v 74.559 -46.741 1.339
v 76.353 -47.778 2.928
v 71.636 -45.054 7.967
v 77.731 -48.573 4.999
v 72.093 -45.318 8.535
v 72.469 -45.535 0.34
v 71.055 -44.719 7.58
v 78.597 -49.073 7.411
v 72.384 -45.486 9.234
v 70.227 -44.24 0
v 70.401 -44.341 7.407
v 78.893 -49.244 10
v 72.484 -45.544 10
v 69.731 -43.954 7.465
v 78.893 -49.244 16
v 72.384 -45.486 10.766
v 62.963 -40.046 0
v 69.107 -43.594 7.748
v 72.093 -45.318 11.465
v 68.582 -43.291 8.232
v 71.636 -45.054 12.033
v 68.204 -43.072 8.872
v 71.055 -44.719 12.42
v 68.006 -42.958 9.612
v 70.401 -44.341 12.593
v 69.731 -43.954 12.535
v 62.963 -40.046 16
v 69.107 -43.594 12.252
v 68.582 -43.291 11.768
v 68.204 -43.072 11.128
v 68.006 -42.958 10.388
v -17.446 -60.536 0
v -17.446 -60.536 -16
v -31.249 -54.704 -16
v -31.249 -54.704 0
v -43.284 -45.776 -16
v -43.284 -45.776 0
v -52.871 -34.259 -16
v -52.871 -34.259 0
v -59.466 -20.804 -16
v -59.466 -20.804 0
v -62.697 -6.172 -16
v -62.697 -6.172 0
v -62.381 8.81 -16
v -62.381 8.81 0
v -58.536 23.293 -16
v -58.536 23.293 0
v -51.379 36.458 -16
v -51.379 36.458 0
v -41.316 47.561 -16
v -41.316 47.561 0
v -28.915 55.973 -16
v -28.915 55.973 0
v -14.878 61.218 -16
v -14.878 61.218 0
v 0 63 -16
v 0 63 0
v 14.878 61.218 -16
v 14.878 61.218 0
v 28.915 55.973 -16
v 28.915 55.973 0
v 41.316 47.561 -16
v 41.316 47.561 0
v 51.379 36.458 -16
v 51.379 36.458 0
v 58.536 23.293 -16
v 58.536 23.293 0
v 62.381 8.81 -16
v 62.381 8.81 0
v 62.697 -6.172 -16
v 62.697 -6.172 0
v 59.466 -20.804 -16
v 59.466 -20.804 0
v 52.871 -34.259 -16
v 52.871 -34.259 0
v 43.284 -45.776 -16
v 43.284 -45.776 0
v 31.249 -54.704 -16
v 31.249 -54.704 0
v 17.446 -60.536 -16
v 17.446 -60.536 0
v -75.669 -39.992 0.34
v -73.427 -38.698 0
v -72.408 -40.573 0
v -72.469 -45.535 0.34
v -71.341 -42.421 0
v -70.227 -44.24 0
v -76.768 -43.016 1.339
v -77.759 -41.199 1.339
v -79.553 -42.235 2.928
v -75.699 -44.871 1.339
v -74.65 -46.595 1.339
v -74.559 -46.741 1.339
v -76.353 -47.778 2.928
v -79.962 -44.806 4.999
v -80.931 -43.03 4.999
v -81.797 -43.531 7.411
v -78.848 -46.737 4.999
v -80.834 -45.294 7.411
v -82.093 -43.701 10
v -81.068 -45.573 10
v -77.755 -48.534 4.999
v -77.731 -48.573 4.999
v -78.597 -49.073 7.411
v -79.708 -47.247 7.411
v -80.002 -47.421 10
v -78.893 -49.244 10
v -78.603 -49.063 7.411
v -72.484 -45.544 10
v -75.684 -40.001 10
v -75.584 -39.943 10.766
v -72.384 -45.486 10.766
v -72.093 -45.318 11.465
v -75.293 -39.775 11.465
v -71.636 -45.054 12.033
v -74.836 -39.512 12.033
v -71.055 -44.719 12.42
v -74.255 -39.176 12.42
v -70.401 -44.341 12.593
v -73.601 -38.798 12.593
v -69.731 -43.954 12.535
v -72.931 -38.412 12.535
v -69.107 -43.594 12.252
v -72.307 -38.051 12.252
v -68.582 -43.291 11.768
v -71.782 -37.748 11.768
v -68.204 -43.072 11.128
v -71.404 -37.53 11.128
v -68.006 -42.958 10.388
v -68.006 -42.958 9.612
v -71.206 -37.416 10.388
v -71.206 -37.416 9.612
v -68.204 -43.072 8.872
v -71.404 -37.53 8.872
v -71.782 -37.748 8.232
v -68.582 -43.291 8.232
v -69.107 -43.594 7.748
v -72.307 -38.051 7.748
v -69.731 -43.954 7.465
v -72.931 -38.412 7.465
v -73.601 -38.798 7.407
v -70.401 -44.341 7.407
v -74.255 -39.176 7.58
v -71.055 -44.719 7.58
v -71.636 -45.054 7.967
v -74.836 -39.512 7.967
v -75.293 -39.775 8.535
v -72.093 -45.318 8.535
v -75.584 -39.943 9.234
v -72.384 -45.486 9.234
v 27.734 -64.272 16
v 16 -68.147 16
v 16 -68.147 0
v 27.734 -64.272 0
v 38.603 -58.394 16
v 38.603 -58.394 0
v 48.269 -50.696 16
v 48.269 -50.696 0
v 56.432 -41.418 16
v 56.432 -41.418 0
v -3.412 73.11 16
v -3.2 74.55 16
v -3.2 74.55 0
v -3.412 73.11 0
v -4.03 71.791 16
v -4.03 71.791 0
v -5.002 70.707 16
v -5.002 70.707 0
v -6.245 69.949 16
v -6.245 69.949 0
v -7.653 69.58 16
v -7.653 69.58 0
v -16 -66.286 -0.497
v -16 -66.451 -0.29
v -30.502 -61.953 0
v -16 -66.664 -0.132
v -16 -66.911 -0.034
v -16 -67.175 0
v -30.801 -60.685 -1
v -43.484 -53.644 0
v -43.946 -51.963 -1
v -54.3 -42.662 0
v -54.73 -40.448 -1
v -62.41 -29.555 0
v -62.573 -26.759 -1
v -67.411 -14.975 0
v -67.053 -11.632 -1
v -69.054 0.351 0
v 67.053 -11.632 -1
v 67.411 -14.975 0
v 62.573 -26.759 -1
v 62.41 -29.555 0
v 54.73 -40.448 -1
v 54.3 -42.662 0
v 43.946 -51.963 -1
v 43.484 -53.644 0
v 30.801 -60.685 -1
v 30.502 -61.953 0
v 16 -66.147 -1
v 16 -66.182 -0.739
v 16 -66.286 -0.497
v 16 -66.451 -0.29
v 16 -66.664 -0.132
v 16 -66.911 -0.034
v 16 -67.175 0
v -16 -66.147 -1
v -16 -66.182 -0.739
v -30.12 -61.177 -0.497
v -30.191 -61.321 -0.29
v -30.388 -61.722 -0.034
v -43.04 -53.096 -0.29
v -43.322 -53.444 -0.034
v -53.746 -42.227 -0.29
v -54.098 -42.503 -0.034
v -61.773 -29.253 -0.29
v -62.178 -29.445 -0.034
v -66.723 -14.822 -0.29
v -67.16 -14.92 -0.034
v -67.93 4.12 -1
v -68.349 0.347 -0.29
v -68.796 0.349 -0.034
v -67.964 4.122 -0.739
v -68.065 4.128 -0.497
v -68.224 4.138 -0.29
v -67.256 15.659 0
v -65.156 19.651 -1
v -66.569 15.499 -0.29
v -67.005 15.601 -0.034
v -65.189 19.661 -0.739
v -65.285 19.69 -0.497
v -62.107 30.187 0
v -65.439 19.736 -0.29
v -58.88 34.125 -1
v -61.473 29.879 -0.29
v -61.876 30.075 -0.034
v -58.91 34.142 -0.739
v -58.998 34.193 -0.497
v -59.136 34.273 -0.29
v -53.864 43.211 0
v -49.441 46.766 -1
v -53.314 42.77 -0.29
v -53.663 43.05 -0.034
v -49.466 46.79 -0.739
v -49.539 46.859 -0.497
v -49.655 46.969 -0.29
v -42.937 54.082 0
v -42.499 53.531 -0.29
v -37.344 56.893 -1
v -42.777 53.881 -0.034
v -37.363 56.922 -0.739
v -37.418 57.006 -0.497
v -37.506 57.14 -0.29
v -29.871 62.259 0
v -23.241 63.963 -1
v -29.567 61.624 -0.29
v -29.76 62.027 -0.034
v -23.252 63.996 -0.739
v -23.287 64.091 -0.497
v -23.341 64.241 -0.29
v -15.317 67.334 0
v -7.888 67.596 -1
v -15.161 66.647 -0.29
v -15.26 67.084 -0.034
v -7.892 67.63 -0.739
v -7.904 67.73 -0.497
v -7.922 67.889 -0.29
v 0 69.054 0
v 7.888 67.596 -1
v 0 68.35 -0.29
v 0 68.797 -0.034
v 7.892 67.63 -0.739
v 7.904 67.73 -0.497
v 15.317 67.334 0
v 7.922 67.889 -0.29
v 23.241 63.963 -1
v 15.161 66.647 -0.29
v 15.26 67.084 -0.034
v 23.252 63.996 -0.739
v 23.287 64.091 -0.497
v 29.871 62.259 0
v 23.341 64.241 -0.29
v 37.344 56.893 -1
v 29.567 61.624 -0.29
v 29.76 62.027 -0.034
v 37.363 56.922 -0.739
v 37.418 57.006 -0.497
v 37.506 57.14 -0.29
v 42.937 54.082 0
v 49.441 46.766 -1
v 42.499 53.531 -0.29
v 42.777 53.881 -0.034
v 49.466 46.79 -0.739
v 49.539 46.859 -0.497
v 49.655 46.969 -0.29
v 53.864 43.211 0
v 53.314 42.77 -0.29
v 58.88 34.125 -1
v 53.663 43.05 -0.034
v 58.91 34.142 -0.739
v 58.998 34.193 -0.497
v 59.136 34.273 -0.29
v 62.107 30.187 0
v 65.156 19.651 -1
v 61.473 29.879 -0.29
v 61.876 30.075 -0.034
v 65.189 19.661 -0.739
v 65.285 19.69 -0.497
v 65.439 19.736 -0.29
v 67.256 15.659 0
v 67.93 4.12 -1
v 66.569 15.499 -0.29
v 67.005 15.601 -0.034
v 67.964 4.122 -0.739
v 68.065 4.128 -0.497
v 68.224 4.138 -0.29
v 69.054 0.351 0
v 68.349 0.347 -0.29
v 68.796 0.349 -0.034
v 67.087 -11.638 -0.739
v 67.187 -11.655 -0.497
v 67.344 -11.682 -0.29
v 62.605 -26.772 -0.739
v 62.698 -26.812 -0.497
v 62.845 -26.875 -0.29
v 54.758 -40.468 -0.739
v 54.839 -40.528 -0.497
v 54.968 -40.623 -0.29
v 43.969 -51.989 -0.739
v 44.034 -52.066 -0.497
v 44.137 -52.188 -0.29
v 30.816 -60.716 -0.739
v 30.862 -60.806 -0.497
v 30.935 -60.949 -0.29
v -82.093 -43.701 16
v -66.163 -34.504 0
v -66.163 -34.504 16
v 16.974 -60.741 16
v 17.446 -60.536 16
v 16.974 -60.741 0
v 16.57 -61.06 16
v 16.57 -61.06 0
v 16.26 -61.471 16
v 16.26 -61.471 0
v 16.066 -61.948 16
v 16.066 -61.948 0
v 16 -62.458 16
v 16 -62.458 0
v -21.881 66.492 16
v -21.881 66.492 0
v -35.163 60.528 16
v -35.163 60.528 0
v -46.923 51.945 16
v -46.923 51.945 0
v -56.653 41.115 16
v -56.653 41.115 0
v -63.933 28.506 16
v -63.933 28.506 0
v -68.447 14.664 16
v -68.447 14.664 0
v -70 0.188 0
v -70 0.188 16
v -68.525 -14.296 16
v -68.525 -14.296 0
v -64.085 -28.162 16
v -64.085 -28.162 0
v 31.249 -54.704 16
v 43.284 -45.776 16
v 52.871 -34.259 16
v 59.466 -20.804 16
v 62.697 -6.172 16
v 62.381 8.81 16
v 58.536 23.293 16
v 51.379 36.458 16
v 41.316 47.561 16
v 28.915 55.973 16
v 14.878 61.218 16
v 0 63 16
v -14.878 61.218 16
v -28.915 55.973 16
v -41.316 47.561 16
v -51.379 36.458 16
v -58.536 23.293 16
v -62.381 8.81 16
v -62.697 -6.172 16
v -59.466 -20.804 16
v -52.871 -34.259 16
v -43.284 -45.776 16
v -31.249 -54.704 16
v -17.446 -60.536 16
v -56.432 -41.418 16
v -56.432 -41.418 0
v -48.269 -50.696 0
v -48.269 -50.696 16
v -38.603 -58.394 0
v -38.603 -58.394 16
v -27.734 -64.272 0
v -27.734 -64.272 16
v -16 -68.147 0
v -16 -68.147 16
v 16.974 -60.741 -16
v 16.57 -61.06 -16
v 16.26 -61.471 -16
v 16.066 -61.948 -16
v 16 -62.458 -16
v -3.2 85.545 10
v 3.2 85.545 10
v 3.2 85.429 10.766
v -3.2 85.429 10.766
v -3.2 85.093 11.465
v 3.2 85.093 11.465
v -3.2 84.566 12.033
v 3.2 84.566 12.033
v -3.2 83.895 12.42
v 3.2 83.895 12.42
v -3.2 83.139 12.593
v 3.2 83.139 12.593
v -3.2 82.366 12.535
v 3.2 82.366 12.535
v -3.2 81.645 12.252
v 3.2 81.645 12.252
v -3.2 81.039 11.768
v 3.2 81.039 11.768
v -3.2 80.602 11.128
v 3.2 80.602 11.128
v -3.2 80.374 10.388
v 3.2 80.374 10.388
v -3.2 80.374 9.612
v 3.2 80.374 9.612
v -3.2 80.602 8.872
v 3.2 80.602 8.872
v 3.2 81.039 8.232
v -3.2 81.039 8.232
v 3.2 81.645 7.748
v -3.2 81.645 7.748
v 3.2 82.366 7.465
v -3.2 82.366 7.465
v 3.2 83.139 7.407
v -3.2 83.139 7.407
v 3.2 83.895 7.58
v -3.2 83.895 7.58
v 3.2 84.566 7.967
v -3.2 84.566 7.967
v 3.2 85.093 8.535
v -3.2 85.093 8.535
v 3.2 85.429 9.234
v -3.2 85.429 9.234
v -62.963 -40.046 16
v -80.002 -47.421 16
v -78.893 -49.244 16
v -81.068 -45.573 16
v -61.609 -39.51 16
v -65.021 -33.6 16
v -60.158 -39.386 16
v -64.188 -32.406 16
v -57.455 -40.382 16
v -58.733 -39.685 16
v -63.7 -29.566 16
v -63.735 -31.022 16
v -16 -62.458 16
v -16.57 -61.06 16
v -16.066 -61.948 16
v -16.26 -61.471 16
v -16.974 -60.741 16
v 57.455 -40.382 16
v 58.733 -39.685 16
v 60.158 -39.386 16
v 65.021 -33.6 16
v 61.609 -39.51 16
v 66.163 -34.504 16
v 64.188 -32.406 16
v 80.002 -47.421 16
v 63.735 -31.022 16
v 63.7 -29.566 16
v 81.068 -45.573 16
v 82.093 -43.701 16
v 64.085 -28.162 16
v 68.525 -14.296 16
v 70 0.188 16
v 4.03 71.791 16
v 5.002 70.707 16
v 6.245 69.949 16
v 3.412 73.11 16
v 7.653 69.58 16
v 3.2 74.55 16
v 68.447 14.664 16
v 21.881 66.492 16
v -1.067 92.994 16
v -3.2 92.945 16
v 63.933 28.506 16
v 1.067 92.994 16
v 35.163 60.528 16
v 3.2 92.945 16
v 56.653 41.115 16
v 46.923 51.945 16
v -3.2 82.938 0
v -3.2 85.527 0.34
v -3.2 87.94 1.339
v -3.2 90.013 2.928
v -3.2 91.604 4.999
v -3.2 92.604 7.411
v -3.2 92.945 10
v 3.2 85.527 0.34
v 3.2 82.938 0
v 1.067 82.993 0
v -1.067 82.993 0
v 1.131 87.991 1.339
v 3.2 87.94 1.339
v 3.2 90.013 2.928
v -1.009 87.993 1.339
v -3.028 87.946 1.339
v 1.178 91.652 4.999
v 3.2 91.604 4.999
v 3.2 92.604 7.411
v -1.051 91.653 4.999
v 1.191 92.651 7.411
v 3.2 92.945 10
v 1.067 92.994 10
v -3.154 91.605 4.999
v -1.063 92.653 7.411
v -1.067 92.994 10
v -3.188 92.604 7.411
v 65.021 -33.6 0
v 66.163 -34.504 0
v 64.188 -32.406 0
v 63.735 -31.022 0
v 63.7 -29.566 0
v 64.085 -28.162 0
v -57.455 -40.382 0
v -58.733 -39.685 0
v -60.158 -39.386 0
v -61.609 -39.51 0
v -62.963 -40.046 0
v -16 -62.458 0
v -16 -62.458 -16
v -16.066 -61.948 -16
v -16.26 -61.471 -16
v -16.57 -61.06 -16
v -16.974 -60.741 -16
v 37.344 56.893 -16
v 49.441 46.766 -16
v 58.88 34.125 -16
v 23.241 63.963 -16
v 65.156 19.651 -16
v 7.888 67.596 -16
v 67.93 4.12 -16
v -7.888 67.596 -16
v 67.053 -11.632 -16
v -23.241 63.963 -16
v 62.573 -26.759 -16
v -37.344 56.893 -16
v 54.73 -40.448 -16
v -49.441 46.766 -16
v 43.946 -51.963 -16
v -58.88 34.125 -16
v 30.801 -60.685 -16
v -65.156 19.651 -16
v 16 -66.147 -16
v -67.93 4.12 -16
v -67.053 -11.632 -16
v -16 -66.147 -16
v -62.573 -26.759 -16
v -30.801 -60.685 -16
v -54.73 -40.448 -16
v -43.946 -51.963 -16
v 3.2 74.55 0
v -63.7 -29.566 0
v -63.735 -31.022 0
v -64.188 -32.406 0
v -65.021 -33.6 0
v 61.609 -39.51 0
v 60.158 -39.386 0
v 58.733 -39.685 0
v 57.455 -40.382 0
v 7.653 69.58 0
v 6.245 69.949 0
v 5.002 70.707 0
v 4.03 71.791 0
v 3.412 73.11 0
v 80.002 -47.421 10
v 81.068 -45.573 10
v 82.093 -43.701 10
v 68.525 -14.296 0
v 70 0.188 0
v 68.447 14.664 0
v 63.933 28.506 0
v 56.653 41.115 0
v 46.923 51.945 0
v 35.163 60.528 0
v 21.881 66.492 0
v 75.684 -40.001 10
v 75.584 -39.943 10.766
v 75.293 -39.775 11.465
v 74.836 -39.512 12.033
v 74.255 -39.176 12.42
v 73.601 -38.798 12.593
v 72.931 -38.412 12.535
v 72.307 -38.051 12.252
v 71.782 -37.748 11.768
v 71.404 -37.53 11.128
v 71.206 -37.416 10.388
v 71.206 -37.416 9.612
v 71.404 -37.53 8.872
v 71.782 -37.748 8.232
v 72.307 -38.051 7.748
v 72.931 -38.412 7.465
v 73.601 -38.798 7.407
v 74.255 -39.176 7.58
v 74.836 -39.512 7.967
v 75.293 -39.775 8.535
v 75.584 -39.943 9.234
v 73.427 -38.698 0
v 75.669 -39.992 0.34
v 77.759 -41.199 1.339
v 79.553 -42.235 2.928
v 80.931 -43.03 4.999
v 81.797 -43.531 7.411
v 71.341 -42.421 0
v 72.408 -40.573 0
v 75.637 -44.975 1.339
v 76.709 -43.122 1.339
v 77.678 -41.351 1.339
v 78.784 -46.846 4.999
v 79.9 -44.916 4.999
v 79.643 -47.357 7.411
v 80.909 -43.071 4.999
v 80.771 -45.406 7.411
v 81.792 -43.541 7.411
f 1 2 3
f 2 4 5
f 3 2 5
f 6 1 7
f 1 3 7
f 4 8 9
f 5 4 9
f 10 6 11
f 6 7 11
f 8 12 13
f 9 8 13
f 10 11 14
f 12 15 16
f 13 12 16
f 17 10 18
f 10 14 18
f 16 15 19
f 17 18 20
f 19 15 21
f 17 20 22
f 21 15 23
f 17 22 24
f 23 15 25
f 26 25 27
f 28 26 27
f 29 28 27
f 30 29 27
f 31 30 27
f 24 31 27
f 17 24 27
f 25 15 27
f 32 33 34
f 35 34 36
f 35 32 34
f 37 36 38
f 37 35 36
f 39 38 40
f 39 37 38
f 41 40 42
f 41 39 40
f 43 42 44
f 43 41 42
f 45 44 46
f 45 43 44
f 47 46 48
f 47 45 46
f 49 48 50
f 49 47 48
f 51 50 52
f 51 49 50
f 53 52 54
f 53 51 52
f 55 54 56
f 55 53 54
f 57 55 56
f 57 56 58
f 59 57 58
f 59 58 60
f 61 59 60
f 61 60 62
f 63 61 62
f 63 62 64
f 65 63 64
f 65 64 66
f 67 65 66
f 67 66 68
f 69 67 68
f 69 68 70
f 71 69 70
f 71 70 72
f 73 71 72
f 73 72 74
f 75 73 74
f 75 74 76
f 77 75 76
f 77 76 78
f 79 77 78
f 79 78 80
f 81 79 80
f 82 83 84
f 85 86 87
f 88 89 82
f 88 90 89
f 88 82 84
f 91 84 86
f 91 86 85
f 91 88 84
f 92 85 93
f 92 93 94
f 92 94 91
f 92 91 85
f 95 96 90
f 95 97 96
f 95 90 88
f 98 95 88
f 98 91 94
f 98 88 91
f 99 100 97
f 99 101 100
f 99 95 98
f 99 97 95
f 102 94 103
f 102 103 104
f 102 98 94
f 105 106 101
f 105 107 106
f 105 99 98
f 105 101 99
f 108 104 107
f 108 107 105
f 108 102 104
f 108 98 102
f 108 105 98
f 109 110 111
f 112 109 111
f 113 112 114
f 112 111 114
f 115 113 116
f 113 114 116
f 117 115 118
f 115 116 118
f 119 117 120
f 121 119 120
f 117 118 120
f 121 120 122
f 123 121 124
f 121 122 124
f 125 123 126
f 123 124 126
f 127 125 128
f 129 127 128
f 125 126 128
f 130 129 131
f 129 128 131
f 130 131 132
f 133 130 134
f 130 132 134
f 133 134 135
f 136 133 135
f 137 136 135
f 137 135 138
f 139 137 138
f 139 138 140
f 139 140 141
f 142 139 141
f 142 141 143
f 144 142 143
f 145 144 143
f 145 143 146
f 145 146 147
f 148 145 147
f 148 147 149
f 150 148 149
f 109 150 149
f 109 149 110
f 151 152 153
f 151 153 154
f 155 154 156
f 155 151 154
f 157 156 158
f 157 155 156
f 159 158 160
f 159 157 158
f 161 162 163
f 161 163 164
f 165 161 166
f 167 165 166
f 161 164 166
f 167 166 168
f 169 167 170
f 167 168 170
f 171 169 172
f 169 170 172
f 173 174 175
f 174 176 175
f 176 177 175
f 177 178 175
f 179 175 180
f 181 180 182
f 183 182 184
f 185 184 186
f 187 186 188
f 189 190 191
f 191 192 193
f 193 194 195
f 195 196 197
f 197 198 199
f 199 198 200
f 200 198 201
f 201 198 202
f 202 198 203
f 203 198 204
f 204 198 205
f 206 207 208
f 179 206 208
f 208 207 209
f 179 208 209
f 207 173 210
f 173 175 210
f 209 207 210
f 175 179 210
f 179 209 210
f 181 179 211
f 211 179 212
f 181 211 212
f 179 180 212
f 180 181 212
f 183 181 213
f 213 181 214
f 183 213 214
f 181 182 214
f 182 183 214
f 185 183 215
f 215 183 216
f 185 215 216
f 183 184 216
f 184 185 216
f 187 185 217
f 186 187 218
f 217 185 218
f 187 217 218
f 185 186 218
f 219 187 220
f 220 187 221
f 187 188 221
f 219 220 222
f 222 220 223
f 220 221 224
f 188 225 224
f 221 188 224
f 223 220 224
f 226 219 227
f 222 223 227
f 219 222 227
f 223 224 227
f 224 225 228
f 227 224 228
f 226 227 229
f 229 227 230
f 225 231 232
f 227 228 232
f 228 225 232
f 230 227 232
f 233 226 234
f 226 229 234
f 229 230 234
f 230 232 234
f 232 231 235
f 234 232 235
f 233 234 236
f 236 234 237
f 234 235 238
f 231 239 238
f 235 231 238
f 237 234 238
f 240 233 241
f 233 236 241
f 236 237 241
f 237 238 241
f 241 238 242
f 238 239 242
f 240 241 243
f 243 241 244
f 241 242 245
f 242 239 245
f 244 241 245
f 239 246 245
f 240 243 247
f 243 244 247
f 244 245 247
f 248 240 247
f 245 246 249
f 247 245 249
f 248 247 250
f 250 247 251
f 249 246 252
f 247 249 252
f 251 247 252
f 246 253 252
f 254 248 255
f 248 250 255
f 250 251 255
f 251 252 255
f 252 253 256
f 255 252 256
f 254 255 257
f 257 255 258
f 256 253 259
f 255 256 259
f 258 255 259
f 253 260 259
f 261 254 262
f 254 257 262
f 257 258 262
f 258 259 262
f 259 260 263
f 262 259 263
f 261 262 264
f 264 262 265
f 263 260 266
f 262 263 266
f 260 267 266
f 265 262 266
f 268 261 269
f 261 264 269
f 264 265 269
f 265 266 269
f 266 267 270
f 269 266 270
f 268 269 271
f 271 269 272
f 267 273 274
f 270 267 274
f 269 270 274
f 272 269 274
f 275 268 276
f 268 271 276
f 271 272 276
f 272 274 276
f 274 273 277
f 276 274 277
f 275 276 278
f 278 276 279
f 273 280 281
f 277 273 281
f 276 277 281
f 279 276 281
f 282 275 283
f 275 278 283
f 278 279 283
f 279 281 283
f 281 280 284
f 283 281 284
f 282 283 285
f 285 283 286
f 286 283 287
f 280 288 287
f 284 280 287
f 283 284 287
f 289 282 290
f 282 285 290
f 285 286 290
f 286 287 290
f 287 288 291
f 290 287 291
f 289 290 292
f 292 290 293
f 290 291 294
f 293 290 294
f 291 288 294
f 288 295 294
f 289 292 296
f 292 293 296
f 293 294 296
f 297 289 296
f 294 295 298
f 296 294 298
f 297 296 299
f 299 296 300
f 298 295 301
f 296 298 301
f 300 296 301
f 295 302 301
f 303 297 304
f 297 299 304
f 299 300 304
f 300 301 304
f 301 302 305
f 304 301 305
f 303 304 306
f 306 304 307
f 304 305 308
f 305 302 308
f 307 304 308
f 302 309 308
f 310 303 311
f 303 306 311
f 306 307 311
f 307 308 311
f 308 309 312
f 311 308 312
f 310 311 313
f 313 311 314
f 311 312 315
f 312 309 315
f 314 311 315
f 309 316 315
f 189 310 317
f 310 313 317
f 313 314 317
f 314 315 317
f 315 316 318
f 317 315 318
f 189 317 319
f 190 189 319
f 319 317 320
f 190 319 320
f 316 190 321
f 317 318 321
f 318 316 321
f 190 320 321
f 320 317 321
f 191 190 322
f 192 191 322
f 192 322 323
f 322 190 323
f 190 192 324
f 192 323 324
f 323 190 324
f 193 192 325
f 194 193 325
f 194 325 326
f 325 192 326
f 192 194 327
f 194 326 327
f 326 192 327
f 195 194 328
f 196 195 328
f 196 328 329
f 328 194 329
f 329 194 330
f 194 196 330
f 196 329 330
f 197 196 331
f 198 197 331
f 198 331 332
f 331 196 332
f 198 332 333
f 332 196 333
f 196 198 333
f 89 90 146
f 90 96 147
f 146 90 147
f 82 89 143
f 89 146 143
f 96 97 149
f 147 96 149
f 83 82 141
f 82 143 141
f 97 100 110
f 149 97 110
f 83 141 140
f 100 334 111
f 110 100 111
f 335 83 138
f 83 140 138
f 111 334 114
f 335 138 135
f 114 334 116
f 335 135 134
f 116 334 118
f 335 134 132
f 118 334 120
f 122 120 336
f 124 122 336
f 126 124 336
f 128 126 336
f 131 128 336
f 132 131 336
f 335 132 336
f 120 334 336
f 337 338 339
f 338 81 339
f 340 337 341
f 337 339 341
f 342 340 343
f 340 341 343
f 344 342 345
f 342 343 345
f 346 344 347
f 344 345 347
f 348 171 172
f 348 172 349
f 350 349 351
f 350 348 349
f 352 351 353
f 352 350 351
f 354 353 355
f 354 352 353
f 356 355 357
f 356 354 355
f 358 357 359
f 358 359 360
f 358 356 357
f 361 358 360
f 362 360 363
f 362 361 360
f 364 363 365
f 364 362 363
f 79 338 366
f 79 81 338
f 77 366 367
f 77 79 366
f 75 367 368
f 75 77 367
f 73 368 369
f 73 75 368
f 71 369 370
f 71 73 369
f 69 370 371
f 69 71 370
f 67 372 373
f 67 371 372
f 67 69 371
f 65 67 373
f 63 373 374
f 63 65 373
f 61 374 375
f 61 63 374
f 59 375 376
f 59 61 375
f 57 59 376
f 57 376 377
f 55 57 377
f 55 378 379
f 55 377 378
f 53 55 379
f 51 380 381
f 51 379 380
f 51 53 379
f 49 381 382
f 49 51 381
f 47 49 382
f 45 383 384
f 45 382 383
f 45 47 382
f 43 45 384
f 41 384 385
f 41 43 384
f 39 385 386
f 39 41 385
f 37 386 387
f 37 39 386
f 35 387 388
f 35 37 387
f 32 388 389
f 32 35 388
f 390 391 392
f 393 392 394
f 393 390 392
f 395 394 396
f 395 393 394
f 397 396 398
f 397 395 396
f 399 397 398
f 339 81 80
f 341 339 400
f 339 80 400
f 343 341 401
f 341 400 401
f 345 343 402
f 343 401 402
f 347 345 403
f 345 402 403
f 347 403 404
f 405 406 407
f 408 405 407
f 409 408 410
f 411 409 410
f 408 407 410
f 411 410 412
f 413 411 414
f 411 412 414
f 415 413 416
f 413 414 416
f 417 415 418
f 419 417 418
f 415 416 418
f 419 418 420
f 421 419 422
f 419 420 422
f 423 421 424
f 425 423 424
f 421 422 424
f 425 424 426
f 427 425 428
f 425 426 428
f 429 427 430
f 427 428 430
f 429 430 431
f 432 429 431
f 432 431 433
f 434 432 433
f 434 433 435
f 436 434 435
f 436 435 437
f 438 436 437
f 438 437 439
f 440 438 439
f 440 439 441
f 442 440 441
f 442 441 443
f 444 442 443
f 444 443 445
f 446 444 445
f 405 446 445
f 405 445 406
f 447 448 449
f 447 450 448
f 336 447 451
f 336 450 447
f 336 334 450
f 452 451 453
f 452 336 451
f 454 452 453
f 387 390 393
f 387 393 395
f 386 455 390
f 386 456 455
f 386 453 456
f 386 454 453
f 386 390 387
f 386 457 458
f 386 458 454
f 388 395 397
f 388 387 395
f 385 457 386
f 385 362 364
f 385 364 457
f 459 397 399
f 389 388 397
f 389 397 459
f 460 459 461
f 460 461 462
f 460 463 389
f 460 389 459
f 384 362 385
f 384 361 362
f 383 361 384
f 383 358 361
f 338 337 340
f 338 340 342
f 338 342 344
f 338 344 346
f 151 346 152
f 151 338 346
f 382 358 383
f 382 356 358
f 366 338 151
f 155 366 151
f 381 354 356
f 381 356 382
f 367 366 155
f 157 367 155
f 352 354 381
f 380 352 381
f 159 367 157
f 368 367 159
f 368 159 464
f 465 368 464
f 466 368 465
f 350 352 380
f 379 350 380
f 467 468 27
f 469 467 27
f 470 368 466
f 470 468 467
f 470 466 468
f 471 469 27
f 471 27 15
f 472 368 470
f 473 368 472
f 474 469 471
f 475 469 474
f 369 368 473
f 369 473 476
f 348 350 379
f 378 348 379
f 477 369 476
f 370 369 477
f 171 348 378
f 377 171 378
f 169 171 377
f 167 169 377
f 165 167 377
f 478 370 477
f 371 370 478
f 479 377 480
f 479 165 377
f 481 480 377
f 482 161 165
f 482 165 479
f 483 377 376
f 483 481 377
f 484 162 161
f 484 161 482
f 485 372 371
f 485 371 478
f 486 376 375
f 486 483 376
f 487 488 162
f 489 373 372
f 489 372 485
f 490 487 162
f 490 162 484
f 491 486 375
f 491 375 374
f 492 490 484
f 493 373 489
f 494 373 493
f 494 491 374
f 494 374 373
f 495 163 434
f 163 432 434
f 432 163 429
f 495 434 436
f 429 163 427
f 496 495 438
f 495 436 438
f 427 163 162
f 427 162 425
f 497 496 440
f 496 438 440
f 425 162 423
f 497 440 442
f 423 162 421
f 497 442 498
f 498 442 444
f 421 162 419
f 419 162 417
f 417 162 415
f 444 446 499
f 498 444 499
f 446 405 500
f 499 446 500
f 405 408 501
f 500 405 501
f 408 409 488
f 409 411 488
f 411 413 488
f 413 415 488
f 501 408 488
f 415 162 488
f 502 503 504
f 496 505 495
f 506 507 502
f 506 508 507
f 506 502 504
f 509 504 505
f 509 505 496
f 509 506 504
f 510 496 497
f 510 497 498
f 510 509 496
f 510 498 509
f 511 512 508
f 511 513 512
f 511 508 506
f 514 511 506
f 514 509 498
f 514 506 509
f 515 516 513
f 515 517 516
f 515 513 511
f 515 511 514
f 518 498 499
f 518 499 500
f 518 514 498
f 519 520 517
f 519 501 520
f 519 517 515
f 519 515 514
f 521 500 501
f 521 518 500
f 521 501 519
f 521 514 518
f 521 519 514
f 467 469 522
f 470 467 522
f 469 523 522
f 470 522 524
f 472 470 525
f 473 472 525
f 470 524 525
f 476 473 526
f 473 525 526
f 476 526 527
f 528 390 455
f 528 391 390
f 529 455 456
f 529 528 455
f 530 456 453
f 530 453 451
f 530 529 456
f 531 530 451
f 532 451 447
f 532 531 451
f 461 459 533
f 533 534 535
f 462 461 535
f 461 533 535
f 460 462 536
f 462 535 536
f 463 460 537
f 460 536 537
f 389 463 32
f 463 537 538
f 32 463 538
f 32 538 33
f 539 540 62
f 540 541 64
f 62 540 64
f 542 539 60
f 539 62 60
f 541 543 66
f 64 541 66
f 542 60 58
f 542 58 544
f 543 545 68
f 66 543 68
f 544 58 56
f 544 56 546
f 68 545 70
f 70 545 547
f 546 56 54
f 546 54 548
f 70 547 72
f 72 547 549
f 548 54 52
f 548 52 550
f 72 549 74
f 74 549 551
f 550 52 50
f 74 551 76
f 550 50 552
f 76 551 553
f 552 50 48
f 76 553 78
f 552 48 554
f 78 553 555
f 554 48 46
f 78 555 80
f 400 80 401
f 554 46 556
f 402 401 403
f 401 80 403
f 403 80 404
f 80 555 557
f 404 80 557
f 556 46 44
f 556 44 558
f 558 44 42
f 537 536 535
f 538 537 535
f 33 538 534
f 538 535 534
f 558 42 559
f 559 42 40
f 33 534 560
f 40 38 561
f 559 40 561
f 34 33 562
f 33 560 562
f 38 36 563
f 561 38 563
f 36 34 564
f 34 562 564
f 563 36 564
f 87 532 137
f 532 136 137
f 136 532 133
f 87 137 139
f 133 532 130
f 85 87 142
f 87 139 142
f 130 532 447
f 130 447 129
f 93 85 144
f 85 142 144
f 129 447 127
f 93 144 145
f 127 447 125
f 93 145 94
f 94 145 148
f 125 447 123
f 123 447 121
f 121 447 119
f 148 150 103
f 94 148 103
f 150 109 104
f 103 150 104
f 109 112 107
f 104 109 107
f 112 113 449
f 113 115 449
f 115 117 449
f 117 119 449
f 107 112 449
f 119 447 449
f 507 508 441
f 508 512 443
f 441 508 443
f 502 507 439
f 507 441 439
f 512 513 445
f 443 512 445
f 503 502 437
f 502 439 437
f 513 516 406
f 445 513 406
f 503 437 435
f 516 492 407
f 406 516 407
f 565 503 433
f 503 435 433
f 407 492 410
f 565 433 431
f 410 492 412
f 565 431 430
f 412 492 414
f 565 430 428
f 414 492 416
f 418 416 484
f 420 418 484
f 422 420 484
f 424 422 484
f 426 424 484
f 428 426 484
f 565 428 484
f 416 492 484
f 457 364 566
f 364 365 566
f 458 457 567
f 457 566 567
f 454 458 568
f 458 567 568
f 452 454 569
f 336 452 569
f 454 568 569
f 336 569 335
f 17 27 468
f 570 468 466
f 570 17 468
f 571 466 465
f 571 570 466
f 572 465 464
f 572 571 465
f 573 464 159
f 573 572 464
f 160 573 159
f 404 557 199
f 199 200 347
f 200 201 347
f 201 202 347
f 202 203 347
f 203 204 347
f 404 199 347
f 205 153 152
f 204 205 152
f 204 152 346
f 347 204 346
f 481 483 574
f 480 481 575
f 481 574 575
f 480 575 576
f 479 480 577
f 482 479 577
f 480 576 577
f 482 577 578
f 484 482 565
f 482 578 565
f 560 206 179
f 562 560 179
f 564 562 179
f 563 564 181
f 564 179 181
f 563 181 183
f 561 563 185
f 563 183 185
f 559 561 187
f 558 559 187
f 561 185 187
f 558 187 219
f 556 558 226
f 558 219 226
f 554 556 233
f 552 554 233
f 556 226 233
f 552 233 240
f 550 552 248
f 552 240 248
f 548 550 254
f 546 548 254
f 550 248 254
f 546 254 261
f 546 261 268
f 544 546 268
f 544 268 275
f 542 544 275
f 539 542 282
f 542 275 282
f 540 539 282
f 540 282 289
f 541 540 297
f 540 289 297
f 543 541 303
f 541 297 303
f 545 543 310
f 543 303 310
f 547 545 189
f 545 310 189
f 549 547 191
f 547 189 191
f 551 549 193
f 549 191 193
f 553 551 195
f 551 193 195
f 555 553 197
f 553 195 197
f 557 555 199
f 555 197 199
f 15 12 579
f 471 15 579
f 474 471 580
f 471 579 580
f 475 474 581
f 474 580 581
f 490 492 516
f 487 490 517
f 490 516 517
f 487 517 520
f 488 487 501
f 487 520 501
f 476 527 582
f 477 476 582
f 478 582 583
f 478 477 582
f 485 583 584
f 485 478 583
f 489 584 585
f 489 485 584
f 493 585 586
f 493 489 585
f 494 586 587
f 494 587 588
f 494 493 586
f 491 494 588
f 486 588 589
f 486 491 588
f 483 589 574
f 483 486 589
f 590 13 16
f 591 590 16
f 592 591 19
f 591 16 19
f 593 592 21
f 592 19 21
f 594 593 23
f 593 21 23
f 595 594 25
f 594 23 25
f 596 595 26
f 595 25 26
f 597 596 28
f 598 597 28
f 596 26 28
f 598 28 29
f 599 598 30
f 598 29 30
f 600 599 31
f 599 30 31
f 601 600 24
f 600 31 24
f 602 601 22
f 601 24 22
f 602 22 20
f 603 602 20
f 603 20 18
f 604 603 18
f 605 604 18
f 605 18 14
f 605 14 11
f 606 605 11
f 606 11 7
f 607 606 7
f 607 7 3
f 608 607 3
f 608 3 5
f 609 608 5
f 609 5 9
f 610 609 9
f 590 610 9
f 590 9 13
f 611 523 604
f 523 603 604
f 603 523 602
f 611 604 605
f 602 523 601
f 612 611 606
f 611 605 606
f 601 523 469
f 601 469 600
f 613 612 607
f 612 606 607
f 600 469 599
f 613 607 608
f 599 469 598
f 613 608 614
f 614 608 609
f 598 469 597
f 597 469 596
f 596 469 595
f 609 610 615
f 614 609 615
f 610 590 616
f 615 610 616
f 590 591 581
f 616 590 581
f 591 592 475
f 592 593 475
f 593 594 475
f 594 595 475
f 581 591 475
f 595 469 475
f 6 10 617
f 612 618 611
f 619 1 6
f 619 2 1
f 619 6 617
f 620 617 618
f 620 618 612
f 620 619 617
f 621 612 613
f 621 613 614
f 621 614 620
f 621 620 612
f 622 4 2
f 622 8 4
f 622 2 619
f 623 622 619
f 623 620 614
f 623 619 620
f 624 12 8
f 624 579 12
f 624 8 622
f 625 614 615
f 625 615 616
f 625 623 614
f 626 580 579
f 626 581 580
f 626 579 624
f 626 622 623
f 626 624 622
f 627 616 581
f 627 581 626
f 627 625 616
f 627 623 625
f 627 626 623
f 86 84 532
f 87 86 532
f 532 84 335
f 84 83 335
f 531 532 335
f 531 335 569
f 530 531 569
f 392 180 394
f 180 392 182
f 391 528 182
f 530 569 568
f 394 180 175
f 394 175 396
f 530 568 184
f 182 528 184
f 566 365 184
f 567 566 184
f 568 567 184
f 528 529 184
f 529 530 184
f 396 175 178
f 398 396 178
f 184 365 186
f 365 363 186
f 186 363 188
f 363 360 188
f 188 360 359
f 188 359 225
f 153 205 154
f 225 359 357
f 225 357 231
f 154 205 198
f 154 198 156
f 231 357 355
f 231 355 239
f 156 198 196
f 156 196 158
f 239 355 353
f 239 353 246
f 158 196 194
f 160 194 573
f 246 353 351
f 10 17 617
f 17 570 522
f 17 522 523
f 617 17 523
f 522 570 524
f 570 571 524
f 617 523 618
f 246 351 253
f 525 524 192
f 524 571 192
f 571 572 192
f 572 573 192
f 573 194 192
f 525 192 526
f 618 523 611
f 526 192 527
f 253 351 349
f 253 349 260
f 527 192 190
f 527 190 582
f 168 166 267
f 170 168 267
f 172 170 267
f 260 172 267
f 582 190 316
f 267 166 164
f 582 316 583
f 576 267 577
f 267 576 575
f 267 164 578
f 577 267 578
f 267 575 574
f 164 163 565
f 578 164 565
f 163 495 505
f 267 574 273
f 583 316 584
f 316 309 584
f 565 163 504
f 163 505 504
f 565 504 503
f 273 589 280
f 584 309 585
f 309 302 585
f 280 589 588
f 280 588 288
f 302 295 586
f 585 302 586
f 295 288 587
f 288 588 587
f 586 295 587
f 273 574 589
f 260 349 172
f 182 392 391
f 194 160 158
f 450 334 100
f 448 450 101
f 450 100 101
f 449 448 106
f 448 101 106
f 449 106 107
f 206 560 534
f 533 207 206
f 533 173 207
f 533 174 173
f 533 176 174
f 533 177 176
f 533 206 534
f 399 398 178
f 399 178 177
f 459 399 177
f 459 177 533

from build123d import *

# Parameters (mm, degrees)
SKETCH_R              = 93
SKETCH_R_2            = 63
PAD_DEPTH             = 16
POCKET_DEPTH          = 543.060769
POLARPATTERN_COUNT    = 3
SKETCH002_W           = 32
SKETCH002_H           = 146
POCKET001_DEPTH       = 16.001
SKETCH003_R           = 2.6
POCKET002_DEPTH       = 546.51444
POLARPATTERN001_COUNT = 3
PAD001_DEPTH          = 16
FILLET_R              = 1
FILLET001_R           = 2
FILLET002_R           = 10
FILLET003_R           = 5


with BuildPart() as part:
    # Sketch → Pad (new body)
    with BuildSketch(Plane.XY):
        Circle(SKETCH_R)
        Circle(SKETCH_R_2, mode=Mode.SUBTRACT)
    extrude(amount=PAD_DEPTH)

    # Sketch001 (on Face4 of Pad) → Pocket (cut, through all)
    with BuildSketch(Plane.XY.offset(16)):
        with BuildLine():
            ThreePointArc((62.158402, -32.192128), (60.621778, 35), (3.2, 69.926819))
            Line((3.2, 205.926819), (3.2, 69.926819))
            ThreePointArc((179.937856, -100.192128), (178.359387, 102.97584), (3.2, 205.926819))
            Line((62.158402, -32.192128), (179.937856, -100.192128))
        make_face()
    pocket = extrude(amount=-POCKET_DEPTH, mode=Mode.SUBTRACT)

    # PolarPattern: Pocket ×3 about axis
    polarpattern_axis = Axis((0, 0, 16), (0, 0, 1))
    for i in range(1, POLARPATTERN_COUNT):
        add(pocket.rotate(polarpattern_axis, i * 360 / POLARPATTERN_COUNT), mode=Mode.SUBTRACT)

    # Sketch002 (on Face4 of PolarPattern) → Pocket001 (cut, through all)
    with BuildSketch(Plane.XY.offset(16)):
        with Locations((0, -73)):
            Rectangle(SKETCH002_W, SKETCH002_H)
    extrude(amount=-POCKET001_DEPTH, mode=Mode.SUBTRACT)

    # Sketch003 (on Face5 of Pocket001) → Pocket002 (cut, through all)
    with BuildSketch(Plane.YZ.offset(3.2)):
        with Locations((82.94493, 10)):
            Circle(SKETCH003_R)
    pocket002 = extrude(amount=-POCKET002_DEPTH, mode=Mode.SUBTRACT)

    # PolarPattern001: Pocket002 ×3 about axis
    polarpattern001_axis = Axis((0, 0, 0), (0, 0, 1))
    for i in range(1, POLARPATTERN001_COUNT):
        add(pocket002.rotate(polarpattern001_axis, i * 360 / POLARPATTERN001_COUNT), mode=Mode.SUBTRACT)

    # Sketch004 (on Face2 of PolarPattern001) → Pad001 (join)
    with BuildSketch(Plane(origin=(0, 0, 0), x_dir=(1, 0, 0), z_dir=(0, 0, -1))):
        with BuildLine():
            ThreePointArc((-16, 60.934391), (0, -63), (16, 60.934391))
            Line((16, 66.1469), (16, 60.934391))
            ThreePointArc((-16, 66.1469), (0, -68.054481), (16, 66.1469))
            Line((-16, 66.1469), (-16, 60.934391))
        make_face()
    extrude(amount=PAD001_DEPTH)

    # Fillet
    fillet_edges = [part.edges().sort_by_distance(p)[0] for p in [
        (0, 68.054481, 0),
    ]]
    fillet(fillet_edges, radius=FILLET_R)

    # Fillet001
    fillet001_edges = [part.edges().sort_by_distance(p)[0] for p in [
        (-16, -60.934391, -8),
        (-16, -60.934391, 8),
        (16, -60.934391, -8),
        (16, -60.934391, 8),
    ]]
    fillet(fillet001_edges, radius=FILLET001_R)

    # Fillet002
    fillet002_edges = [part.edges().sort_by_distance(p)[0] for p in [
        (-80.540363, -46.5, 0),
        (80.540363, -46.5, 0),
        (0, 93, 0),
    ]]
    fillet(fillet002_edges, radius=FILLET002_R)

    # Fillet003
    fillet003_edges = [part.edges().sort_by_distance(p)[0] for p in [
        (62.158402, -32.192128, 8),
        (58.958402, -37.734691, 8),
        (-58.958402, -37.734691, 8),
        (-62.158402, -32.192128, 8),
        (-3.2, 69.926819, 8),
        (3.2, 69.926819, 8),
    ]]
    fillet(fillet003_edges, radius=FILLET003_R)


solid = part.part
